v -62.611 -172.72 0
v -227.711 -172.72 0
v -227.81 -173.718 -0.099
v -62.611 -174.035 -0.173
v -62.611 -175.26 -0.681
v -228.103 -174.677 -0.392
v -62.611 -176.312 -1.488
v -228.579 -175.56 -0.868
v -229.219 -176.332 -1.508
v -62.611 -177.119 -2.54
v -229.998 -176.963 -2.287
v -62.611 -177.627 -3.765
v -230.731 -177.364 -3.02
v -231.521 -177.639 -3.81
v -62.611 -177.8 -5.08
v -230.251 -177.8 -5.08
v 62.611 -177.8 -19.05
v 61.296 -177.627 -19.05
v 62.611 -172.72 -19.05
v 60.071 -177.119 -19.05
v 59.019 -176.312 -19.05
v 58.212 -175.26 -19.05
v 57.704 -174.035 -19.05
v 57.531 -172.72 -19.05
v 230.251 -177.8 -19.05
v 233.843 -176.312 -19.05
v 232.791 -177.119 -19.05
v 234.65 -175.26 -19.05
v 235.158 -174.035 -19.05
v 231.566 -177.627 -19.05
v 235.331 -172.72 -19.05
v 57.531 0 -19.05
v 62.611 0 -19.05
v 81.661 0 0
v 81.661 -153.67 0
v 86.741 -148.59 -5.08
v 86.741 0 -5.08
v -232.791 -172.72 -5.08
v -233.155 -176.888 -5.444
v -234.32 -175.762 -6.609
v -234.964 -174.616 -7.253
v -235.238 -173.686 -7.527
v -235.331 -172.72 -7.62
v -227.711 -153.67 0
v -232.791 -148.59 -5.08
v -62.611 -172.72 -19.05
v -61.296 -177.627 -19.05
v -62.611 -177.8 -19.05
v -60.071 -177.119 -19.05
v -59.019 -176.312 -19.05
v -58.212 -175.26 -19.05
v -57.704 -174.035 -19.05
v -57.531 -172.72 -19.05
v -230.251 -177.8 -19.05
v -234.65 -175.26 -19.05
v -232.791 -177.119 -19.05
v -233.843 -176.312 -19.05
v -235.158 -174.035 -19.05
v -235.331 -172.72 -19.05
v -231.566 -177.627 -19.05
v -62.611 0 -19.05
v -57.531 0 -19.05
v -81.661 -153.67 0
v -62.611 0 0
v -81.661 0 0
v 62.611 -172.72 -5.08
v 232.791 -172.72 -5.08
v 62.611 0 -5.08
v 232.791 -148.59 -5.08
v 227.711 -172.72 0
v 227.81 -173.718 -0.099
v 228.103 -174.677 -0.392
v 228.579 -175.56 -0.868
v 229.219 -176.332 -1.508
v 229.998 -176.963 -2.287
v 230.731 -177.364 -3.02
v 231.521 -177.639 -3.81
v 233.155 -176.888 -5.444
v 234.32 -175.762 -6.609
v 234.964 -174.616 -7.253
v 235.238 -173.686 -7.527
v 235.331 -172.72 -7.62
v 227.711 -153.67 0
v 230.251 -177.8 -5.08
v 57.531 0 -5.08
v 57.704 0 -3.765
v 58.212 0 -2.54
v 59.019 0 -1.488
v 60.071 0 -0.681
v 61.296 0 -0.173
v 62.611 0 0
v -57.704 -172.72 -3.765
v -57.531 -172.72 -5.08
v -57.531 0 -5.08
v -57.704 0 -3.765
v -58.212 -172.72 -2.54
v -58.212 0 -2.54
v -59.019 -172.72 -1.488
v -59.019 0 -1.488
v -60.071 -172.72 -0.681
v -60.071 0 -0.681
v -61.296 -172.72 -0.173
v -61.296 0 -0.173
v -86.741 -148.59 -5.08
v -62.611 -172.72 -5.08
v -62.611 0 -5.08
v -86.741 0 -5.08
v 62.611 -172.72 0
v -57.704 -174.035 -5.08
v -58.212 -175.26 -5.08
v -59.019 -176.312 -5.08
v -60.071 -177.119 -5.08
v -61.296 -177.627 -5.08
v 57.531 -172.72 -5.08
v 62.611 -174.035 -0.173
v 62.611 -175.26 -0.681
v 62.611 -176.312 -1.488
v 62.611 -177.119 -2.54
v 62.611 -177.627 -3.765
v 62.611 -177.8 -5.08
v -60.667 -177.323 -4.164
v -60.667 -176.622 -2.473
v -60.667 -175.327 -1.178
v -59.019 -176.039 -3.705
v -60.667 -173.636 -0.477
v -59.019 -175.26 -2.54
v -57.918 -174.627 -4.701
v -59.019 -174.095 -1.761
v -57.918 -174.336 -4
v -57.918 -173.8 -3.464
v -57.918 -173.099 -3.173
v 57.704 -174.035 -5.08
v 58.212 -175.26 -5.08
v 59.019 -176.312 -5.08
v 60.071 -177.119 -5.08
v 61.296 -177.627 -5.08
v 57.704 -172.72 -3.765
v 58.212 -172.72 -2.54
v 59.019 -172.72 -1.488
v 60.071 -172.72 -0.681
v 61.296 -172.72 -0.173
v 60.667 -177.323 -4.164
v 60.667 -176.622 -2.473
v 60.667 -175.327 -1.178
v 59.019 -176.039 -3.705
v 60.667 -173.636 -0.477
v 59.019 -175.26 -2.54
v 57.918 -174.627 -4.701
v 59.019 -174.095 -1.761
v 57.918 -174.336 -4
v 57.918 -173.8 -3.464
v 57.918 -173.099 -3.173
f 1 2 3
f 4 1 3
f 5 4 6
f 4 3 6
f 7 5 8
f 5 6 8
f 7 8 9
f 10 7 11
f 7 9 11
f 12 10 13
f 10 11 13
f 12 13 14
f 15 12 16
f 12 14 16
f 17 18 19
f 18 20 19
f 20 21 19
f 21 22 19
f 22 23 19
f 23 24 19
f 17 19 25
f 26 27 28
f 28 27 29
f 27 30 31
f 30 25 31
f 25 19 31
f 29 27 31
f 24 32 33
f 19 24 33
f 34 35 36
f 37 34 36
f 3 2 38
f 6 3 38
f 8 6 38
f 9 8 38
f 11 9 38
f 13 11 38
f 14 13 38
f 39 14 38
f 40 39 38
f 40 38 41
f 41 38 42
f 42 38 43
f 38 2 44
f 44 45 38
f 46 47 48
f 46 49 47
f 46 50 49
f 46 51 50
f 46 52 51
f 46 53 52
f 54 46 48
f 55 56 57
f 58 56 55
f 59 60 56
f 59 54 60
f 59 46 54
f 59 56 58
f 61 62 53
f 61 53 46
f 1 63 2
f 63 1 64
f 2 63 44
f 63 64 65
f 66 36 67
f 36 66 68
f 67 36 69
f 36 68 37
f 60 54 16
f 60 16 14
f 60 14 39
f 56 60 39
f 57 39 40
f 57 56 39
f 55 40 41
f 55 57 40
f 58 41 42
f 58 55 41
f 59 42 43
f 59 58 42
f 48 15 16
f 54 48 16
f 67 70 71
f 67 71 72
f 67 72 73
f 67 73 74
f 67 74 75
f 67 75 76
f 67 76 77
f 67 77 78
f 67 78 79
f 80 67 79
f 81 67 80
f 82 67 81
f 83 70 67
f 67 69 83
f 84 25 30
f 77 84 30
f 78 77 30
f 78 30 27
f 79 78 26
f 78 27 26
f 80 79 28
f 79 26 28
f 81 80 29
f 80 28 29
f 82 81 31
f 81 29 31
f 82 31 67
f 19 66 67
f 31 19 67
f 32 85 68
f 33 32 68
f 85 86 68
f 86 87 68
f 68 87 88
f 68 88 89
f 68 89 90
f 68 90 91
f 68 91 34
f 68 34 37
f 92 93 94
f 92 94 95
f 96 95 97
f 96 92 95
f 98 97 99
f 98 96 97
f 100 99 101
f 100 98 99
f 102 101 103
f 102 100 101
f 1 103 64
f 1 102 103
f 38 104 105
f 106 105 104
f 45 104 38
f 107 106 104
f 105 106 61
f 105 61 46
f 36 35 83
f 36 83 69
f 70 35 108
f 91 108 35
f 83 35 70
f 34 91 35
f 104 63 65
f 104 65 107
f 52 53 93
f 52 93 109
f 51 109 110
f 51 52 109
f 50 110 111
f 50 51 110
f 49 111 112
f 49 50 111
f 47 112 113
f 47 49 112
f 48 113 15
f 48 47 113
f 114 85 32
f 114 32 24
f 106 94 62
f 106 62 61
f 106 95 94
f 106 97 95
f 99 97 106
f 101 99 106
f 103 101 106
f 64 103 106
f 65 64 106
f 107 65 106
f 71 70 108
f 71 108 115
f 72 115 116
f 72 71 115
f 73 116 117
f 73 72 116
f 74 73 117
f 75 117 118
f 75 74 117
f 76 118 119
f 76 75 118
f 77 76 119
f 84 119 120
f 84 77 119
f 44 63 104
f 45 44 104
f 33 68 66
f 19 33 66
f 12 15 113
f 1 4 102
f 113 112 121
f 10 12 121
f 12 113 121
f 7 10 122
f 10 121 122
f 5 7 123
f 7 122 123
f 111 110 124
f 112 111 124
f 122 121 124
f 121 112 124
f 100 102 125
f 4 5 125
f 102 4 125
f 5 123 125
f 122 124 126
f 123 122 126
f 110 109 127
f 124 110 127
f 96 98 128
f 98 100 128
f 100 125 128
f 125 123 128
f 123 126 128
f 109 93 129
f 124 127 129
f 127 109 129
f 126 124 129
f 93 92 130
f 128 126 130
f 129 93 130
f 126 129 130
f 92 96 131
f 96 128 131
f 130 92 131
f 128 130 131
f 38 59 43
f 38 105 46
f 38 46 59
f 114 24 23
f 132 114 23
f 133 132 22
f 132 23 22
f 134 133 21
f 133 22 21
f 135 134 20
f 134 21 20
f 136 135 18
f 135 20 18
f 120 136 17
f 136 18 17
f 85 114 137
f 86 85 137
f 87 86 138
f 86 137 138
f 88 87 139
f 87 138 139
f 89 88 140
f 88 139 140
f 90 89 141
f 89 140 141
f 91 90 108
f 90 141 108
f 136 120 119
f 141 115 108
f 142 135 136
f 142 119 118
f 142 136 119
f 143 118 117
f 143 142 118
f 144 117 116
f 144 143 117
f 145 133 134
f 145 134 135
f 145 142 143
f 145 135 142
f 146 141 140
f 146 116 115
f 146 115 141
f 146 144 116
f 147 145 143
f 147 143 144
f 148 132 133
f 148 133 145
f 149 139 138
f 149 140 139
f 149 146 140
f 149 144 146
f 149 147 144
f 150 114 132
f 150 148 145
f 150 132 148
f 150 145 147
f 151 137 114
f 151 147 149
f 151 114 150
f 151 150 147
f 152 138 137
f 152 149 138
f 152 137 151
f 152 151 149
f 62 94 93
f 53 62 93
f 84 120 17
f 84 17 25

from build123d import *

# Parameters (mm, degrees)
F0_W         = 31.75
F0_H         = 146.05
F0_W_2       = 146.05
F0_H_2       = 31.75
F1_DEPTH     = 19.05
F2_T         = -5.08
F3_T1_DEPTH  = 165.6462243683
F3_T3_DEPTH  = 165.6462243683
F3_T5_DEPTH  = 70.9424487366
F3_T11_DEPTH = 185.2424487366
F3_T15_DEPTH = 185.2424487366
F4_R         = 5.08
F5_T1_DEPTH  = 26.67
F5_T3_DEPTH  = 36.83
F5_S7_W      = 5.08
F5_S7_H      = 5.08
F5_T8_DEPTH  = 5.08


# Not quite as in the source:
# - a fillet or chamfer that OpenCascade refuses, or shapes differently, is made with other operations: its cross-section is extruded or revolved along the edge and cut away or added
# - a feature names something its author has since deleted; it is built from what else it names


with BuildPart() as f1:
    # F0 (on Top) → F1 (new body)
    with BuildSketch(Plane.XY):
        with Locations((73.406, -73.025)):
            Rectangle(F0_W, F0_H)
        with Locations((162.306, -161.925)):
            Rectangle(F0_W_2, F0_H_2)
        with Locations((73.406, -161.925)):
            Rectangle(F0_W, F0_H_2)
    extrude(amount=-F1_DEPTH)

    # F2
    f2_openings = [f1.faces().sort_by_distance(p)[0] for p in [
        (86.766528, -73.025, -19.05),
        (162.306, -146.05, -9.525),
        (89.281, -73.025, -9.525),
        (73.406, 0, -9.525),
        (235.331, -161.925, -9.525),
    ]]
    offset(amount=F2_T, openings=f2_openings)

    # F3: chamfer of 7.62 on 3 edges, made by hand

    # F3_s2 → F3_t1 (cut)
    with BuildSketch(Plane.XZ.offset(-19.5962243683)):
        Polygon((81.661, 0), (89.281, -7.62), (89.281, 0), align=None)
    extrude(amount=F3_T1_DEPTH, mode=Mode.SUBTRACT)

    # F3_s4 → F3_t3 (cut)
    with BuildSketch(Plane.YZ.offset(89.281)):
        Polygon((-153.67, 0), (-146.05, -7.62), (-146.05, 0), align=None)
    extrude(amount=F3_T3_DEPTH, mode=Mode.SUBTRACT)

    # F3_s6 → F3_t5 (cut)
    with BuildSketch(Plane.XZ.offset(126.4537756317)):
        Polygon((227.711, 0), (235.331, -7.62), (235.331, 0), align=None)
    extrude(amount=F3_T5_DEPTH, mode=Mode.SUBTRACT)


with BuildPart() as f3_tool9:
    # F3_s10 → F3_t11 (new body)
    with BuildSketch(Plane.XZ.offset(165.6462243683)):
        Polygon((81.661, 0), (89.281, -7.62), (89.281, 0), align=None)
    extrude(amount=-F3_T11_DEPTH)

    split(bisect_by=Plane.XZ.offset(146.05), keep=Keep.TOP)


with BuildPart() as f3_tool13:
    # F3_s14 → F3_t15 (new body)
    with BuildSketch(Plane.YZ.offset(254.9272243683)):
        Polygon((-153.67, 0), (-146.05, -7.62), (-146.05, 0), align=None)
    extrude(amount=-F3_T15_DEPTH)

    split(bisect_by=Plane.YZ.offset(89.281), keep=Keep.BOTTOM)


with BuildPart() as f3_tool9_1:
    add(f3_tool9.part)

    # F3_t17: intersect F3_tool13
    add(f3_tool13.part, mode=Mode.INTERSECT)


with BuildPart() as f1_1:
    add(f1.part)

    # F3_t7: cut F3_tool9
    add(f3_tool9_1.part, mode=Mode.SUBTRACT)

    # F4
    f4_edges = [f1_1.edges().sort_by_distance(p)[0] for p in [
        (142.621, -177.8, 0),
        (57.531, -88.9, 0),
    ]]
    fillet(f4_edges, radius=F4_R)

    # F5: fillet of radius 5.08 on 2 edges, made by hand

    # F5_s2 → F5_t1 (cut)
    with BuildSketch(Plane.XY.offset(-31.75)):
        with BuildLine():
            ThreePointArc((57.531, -172.72), (59.0188975516, -176.3121024484), (62.611, -177.8))
            Line((62.611, -177.8), (57.531, -177.8))
            Line((57.531, -177.8), (57.531, -172.72))
        make_face()
    extrude(amount=F5_T1_DEPTH, mode=Mode.SUBTRACT)

    # F5_s4 → F5_t3 (cut)
    with BuildSketch(Plane.XY.offset(-31.75)):
        with BuildLine():
            ThreePointArc((230.251, -177.8), (233.8431024484, -176.3121024484), (235.331, -172.72))
            Line((235.331, -172.72), (235.331, -177.8))
            Line((235.331, -177.8), (230.251, -177.8))
        make_face()
    extrude(amount=F5_T3_DEPTH, mode=Mode.SUBTRACT)


with BuildPart() as f5_tool6:
    # F5_s7 → F5_t8 (new body)
    with BuildSketch(Plane.YZ.offset(62.611)):
        with Locations((-175.26, -2.54)):
            Rectangle(F5_S7_W, F5_S7_H)
    extrude(amount=-F5_T8_DEPTH)

    # F5_s9 → F5_t10 (revolve, cut)
    with BuildSketch(Plane(origin=(62.611, -172.72, -5.08), x_dir=(0, 0.7071067812, -0.7071067812), z_dir=(0, 0.7071067812, 0.7071067812))):
        with BuildLine():
            ThreePointArc((0, -5.08), (5.08, 0), (0, 5.08))
            Line((0, 5.08), (0, -5.08))
        make_face()
    revolve(axis=Axis((62.611, -172.72, -5.08), (-1, 0, 0)), mode=Mode.SUBTRACT)


with BuildPart() as f1_2:
    add(f1_1.part)

    # F5_t5: cut F5_tool6
    add(f5_tool6.part, mode=Mode.SUBTRACT)


with BuildPart() as f6_1:
    # F6: instance of F1
    add(f1_2.part.mirror(Plane.YZ))


solid = Compound([f1_2.part, f6_1.part])
